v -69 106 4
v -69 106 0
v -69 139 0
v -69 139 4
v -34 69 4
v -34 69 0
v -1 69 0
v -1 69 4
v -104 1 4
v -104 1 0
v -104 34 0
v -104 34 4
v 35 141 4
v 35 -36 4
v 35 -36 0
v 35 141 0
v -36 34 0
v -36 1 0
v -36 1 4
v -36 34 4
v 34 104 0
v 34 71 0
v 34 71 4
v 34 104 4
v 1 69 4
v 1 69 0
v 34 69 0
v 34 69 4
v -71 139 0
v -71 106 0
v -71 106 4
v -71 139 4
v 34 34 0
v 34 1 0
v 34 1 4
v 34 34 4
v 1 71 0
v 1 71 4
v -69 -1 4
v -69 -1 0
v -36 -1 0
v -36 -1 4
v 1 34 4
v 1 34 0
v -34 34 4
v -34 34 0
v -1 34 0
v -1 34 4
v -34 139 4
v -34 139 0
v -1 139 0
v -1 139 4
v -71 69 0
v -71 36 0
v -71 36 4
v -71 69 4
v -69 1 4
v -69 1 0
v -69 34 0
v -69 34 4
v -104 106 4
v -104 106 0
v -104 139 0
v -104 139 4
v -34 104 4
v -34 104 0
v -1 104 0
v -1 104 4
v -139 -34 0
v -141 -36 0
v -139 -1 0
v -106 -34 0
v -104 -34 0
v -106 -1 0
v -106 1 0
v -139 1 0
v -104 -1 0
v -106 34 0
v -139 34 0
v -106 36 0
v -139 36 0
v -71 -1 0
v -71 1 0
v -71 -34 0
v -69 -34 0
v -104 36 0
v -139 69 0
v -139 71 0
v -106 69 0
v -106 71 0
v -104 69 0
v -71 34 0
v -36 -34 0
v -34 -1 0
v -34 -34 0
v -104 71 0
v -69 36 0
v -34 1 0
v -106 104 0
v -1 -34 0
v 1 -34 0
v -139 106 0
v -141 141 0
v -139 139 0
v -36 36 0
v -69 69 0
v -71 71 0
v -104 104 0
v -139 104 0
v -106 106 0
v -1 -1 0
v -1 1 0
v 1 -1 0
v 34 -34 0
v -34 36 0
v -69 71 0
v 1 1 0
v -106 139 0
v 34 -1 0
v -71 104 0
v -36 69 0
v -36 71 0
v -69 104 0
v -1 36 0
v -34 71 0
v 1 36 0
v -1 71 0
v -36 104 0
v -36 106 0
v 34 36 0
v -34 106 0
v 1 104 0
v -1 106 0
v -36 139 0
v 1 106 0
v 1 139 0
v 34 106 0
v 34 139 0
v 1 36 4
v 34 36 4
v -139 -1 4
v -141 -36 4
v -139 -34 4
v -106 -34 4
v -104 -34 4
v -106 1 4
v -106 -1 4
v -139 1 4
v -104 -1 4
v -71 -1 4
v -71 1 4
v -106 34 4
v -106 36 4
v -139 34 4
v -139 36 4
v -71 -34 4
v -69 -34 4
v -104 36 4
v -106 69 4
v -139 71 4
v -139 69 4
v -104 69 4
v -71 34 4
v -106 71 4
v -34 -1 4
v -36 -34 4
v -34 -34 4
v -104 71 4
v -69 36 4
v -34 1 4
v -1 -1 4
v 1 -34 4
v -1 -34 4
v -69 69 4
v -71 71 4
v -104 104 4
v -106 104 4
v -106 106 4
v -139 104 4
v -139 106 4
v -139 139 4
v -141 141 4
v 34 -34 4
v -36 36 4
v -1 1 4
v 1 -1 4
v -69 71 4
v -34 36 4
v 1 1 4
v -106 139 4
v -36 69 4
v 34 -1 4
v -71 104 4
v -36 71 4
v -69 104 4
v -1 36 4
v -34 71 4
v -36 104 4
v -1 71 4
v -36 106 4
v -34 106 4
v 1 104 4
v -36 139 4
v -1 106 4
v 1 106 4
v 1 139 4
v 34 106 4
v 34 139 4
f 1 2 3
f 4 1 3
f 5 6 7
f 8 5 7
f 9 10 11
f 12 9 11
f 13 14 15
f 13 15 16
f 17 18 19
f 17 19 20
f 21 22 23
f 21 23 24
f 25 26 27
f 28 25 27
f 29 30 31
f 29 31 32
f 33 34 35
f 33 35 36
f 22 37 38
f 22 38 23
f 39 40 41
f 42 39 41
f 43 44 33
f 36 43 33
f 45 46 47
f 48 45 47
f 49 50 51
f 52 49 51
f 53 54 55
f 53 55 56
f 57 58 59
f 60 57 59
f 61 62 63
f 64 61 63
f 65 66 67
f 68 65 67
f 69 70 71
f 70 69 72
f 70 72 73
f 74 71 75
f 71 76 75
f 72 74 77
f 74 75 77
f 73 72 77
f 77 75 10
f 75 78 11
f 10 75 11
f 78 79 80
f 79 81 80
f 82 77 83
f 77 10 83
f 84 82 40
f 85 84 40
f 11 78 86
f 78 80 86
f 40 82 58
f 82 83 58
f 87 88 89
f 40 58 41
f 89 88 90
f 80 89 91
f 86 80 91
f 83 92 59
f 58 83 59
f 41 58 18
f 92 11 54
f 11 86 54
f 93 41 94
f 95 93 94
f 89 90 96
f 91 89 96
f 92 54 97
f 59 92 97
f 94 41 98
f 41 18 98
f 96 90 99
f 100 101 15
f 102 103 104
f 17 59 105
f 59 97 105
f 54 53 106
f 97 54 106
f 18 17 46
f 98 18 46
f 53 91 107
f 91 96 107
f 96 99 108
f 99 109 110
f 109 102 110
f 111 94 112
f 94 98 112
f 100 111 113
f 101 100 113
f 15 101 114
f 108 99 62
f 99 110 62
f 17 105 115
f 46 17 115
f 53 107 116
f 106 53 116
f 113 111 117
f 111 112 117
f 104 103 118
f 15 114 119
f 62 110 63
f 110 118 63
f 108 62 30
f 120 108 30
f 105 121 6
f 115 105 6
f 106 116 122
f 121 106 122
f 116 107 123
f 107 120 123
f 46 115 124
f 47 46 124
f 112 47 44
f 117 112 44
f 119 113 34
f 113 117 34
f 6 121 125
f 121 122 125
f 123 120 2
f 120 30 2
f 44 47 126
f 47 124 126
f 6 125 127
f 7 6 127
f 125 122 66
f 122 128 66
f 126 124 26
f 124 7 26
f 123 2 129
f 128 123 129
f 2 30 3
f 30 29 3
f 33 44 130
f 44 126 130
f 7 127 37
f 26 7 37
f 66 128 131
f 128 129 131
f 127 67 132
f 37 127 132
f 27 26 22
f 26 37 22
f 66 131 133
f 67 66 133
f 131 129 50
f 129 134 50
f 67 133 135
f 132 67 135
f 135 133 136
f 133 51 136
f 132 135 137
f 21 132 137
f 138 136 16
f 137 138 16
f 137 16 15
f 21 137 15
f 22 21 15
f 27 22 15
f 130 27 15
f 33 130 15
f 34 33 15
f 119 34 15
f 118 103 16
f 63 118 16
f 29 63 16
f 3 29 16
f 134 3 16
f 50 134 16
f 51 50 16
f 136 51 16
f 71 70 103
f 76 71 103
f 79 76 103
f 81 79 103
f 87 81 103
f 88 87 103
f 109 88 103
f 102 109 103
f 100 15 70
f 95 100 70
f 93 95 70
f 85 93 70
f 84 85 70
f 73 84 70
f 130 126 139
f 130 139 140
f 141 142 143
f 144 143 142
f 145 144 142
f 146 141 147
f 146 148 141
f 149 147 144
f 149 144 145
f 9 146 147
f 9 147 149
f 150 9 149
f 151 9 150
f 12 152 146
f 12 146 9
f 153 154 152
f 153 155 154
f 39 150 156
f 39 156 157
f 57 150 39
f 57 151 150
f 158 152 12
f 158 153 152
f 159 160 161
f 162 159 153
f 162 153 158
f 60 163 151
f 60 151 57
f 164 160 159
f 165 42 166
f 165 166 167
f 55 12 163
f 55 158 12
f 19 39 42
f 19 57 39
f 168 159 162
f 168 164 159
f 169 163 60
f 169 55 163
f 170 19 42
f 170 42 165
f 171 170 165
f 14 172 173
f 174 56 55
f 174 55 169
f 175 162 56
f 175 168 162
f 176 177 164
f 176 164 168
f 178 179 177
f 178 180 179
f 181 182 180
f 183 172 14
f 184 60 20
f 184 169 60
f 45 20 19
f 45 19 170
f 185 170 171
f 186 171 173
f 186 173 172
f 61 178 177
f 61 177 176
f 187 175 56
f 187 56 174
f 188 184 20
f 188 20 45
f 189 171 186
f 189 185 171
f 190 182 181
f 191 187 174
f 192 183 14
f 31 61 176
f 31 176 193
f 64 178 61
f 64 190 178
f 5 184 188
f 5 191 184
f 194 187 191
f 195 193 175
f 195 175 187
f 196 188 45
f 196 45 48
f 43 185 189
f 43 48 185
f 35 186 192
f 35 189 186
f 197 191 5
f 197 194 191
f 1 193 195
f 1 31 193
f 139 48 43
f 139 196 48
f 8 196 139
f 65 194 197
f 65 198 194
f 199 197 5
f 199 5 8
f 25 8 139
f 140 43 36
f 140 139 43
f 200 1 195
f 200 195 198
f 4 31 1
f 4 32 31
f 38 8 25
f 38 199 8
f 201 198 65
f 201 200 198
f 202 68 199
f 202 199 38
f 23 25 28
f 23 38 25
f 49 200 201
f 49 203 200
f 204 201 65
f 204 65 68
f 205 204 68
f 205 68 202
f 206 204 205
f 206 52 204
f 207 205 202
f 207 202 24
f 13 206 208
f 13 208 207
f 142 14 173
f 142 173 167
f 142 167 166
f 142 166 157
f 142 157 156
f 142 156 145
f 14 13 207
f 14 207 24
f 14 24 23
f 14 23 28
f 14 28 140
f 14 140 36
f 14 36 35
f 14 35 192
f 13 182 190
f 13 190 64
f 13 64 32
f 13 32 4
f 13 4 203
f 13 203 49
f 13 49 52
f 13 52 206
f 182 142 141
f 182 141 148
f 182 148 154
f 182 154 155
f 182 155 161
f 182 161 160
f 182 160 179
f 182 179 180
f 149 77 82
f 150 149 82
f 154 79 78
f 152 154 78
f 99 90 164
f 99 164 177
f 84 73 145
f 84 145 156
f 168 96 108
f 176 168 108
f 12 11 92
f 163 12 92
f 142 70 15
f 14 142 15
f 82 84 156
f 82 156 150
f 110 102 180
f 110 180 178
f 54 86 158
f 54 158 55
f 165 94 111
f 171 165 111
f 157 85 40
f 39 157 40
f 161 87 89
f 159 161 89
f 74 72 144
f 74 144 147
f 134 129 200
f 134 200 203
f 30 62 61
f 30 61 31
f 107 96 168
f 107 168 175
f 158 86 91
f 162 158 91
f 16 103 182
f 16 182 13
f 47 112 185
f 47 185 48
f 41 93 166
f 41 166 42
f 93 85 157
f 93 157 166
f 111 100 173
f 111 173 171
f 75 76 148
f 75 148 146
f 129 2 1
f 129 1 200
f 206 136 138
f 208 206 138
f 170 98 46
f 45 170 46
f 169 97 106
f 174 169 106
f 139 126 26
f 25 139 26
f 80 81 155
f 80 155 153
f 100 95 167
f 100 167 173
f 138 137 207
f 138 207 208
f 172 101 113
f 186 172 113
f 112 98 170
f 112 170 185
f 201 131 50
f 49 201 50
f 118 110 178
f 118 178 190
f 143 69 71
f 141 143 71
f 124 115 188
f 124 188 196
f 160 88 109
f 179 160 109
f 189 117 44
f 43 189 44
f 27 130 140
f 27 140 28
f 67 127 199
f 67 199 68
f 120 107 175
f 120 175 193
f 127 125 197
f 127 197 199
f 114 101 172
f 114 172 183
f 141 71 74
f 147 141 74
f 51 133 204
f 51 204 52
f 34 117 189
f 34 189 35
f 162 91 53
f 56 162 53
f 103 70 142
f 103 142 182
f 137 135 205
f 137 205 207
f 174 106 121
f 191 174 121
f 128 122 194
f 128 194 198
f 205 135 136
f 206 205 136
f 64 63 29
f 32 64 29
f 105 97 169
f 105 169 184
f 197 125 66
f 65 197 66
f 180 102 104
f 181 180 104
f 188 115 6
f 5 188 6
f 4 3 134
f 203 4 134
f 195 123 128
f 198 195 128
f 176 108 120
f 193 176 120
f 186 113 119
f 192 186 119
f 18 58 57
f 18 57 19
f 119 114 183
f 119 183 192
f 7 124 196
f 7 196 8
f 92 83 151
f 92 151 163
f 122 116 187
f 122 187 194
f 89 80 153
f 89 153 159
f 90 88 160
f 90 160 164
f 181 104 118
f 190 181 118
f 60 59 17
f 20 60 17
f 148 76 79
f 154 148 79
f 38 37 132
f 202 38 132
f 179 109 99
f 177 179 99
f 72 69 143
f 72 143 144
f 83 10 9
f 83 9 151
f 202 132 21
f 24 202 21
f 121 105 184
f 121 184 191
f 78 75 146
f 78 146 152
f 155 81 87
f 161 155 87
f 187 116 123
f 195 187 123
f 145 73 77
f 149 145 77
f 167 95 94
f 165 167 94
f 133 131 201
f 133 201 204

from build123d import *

# Parameters (mm, degrees)
CROQUIS1_W              = 37
CROQUIS1_H              = 37
CROQUIS1_W_2            = 33
CROQUIS1_H_2            = 33
SALIENTE_EXTRUIR1_DEPTH = 4
MATRIZL1_COUNT          = 5
MATRIZL1_PITCH          = 35
MATRIZL1_COUNT_DIR2     = 5
MATRIZL1_PITCH_DIR2     = 35
CROQUIS2_W              = 1
CROQUIS2_H              = 177
CORTAR_EXTRUIR1_DEPTH   = 10


with BuildPart() as part:
    # Croquis1 → Saliente-Extruir1 (new body)
    with BuildSketch(Plane.XY):
        with Locations((17.5, -17.5)):
            Rectangle(CROQUIS1_W, CROQUIS1_H)
        with Locations((17.5, -17.5)):
            Rectangle(CROQUIS1_W_2, CROQUIS1_H_2, mode=Mode.SUBTRACT)
    saliente_extruir1 = extrude(amount=SALIENTE_EXTRUIR1_DEPTH)

    # MatrizL1: Saliente-Extruir1 5 × 5
    with Locations(*[(-i * MATRIZL1_PITCH, j * MATRIZL1_PITCH_DIR2, 0) for i in range(MATRIZL1_COUNT) for j in range(MATRIZL1_COUNT_DIR2) if (i, j) != (0, 0)]):
        add(saliente_extruir1)

    # Croquis2 → Cortar-Extruir1 (cut)
    with BuildSketch(Plane.XY.offset(4)):
        with Locations((35.5, 52.5)):
            Rectangle(CROQUIS2_W, CROQUIS2_H)
    extrude(amount=-CORTAR_EXTRUIR1_DEPTH, mode=Mode.SUBTRACT)


solid = part.part
